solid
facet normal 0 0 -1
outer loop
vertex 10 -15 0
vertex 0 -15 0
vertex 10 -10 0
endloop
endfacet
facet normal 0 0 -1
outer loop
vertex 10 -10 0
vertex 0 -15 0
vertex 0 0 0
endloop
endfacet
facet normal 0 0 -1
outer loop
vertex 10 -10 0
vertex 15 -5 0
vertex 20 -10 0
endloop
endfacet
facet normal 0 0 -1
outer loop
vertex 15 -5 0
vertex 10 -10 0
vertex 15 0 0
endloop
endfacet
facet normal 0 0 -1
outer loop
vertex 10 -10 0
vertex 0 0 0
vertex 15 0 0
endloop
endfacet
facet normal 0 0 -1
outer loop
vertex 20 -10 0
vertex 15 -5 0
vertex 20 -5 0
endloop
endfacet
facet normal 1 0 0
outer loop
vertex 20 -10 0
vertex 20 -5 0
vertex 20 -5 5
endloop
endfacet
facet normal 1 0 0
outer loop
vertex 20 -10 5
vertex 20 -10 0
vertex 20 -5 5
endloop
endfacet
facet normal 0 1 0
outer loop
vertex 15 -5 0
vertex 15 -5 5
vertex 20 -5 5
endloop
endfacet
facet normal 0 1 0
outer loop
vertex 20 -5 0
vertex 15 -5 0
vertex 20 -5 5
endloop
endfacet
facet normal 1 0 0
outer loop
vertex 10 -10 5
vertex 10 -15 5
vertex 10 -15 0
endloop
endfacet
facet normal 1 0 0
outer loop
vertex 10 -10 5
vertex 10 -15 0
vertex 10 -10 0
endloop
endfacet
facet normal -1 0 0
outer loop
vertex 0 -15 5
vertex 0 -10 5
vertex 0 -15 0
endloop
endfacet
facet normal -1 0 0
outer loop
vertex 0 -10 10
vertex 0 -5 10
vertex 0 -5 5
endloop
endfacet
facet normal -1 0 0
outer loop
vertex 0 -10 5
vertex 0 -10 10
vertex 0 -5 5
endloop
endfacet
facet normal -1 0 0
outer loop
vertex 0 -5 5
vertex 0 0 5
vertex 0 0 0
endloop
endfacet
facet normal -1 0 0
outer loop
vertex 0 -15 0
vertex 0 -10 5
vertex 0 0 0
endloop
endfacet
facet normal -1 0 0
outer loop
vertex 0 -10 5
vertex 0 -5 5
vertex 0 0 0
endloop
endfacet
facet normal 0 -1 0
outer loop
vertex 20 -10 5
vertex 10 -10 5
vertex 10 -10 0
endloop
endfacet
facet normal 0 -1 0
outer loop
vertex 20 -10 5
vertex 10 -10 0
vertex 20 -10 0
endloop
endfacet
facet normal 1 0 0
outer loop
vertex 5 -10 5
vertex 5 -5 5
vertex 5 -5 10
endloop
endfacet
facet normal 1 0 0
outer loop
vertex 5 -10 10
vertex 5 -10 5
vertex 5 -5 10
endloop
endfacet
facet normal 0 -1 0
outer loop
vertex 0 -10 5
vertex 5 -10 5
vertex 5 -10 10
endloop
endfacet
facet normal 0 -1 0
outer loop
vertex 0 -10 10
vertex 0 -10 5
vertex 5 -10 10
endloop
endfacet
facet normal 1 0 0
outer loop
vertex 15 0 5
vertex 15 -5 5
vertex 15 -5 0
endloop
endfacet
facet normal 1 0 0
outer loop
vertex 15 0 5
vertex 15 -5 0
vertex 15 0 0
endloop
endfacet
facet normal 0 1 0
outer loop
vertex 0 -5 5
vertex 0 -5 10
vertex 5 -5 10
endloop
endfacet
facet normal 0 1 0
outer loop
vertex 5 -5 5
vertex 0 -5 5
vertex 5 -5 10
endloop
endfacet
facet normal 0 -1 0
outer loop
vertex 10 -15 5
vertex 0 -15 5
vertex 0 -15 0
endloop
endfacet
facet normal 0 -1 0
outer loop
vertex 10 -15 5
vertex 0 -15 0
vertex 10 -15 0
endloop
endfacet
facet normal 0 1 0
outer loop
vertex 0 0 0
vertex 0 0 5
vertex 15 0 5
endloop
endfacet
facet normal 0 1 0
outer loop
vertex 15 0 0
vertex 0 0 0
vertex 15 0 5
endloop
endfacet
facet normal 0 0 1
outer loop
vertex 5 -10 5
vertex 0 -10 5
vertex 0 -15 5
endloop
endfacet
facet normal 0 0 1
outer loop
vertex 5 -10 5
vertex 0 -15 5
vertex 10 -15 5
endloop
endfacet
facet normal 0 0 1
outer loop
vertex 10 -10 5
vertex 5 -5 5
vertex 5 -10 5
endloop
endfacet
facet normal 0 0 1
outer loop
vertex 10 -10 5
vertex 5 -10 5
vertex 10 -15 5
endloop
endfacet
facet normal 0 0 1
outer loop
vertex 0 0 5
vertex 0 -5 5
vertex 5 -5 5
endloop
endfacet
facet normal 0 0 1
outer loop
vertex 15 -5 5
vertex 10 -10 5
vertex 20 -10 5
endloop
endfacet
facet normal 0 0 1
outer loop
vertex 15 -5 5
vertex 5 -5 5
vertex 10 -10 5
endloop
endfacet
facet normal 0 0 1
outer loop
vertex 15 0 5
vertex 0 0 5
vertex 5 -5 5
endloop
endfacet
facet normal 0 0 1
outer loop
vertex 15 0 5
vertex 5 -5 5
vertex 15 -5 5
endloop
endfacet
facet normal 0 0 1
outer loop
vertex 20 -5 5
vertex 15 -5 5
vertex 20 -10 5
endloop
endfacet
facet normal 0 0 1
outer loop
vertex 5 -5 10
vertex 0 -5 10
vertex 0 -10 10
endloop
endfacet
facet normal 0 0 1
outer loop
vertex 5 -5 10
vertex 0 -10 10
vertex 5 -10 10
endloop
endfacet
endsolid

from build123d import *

# Parameters (mm, degrees)
F0_W     = 5
F0_H     = 5
F0_W_2   = 10
F1_DEPTH = 15
F2_DEPTH = 5
F3_W     = 5
F3_H     = 5
F4_DEPTH = 5
F5_W     = 10
F5_H     = 5
F6_DEPTH = 5
F5_W_2   = 5
F7_DEPTH = 5


with BuildPart() as f1:
    # F0 (on Front) → F1 (new body)
    with BuildSketch(Plane.XZ):
        with Locations((2.5, 2.5)):
            Rectangle(F0_W, F0_H)
        with Locations((7.5, 2.5)):
            Rectangle(F0_W, F0_H)
        with Locations((2.5, 7.5)):
            Rectangle(F0_W, F0_H)
        with Locations((15, 2.5)):
            Rectangle(F0_W_2, F0_H)
    extrude(amount=F1_DEPTH)

    # F0 (on Front) → F2 (cut)
    with BuildSketch(Plane.XZ):
        with Locations((2.5, 7.5)):
            Rectangle(F0_W, F0_H)
    extrude(amount=F2_DEPTH, mode=Mode.SUBTRACT)

    # F3 (on face) → F4 (cut)
    with BuildSketch(Plane.YZ.offset(5)):
        with Locations((-12.5, 7.5)):
            Rectangle(F3_W, F3_H)
    extrude(amount=-F4_DEPTH, mode=Mode.SUBTRACT)

    # F5 (on face) → F6 (cut)
    with BuildSketch(Plane.XY.offset(5)):
        with Locations((15, -12.5)):
            Rectangle(F5_W, F5_H)
    extrude(amount=-F6_DEPTH, mode=Mode.SUBTRACT)

    # F5 (on face) → F7 (cut)
    with BuildSketch(Plane.XY.offset(5)):
        with Locations((17.5, -2.5)):
            Rectangle(F5_W_2, F5_H)
    extrude(amount=-F7_DEPTH, mode=Mode.SUBTRACT)


solid = f1.part
